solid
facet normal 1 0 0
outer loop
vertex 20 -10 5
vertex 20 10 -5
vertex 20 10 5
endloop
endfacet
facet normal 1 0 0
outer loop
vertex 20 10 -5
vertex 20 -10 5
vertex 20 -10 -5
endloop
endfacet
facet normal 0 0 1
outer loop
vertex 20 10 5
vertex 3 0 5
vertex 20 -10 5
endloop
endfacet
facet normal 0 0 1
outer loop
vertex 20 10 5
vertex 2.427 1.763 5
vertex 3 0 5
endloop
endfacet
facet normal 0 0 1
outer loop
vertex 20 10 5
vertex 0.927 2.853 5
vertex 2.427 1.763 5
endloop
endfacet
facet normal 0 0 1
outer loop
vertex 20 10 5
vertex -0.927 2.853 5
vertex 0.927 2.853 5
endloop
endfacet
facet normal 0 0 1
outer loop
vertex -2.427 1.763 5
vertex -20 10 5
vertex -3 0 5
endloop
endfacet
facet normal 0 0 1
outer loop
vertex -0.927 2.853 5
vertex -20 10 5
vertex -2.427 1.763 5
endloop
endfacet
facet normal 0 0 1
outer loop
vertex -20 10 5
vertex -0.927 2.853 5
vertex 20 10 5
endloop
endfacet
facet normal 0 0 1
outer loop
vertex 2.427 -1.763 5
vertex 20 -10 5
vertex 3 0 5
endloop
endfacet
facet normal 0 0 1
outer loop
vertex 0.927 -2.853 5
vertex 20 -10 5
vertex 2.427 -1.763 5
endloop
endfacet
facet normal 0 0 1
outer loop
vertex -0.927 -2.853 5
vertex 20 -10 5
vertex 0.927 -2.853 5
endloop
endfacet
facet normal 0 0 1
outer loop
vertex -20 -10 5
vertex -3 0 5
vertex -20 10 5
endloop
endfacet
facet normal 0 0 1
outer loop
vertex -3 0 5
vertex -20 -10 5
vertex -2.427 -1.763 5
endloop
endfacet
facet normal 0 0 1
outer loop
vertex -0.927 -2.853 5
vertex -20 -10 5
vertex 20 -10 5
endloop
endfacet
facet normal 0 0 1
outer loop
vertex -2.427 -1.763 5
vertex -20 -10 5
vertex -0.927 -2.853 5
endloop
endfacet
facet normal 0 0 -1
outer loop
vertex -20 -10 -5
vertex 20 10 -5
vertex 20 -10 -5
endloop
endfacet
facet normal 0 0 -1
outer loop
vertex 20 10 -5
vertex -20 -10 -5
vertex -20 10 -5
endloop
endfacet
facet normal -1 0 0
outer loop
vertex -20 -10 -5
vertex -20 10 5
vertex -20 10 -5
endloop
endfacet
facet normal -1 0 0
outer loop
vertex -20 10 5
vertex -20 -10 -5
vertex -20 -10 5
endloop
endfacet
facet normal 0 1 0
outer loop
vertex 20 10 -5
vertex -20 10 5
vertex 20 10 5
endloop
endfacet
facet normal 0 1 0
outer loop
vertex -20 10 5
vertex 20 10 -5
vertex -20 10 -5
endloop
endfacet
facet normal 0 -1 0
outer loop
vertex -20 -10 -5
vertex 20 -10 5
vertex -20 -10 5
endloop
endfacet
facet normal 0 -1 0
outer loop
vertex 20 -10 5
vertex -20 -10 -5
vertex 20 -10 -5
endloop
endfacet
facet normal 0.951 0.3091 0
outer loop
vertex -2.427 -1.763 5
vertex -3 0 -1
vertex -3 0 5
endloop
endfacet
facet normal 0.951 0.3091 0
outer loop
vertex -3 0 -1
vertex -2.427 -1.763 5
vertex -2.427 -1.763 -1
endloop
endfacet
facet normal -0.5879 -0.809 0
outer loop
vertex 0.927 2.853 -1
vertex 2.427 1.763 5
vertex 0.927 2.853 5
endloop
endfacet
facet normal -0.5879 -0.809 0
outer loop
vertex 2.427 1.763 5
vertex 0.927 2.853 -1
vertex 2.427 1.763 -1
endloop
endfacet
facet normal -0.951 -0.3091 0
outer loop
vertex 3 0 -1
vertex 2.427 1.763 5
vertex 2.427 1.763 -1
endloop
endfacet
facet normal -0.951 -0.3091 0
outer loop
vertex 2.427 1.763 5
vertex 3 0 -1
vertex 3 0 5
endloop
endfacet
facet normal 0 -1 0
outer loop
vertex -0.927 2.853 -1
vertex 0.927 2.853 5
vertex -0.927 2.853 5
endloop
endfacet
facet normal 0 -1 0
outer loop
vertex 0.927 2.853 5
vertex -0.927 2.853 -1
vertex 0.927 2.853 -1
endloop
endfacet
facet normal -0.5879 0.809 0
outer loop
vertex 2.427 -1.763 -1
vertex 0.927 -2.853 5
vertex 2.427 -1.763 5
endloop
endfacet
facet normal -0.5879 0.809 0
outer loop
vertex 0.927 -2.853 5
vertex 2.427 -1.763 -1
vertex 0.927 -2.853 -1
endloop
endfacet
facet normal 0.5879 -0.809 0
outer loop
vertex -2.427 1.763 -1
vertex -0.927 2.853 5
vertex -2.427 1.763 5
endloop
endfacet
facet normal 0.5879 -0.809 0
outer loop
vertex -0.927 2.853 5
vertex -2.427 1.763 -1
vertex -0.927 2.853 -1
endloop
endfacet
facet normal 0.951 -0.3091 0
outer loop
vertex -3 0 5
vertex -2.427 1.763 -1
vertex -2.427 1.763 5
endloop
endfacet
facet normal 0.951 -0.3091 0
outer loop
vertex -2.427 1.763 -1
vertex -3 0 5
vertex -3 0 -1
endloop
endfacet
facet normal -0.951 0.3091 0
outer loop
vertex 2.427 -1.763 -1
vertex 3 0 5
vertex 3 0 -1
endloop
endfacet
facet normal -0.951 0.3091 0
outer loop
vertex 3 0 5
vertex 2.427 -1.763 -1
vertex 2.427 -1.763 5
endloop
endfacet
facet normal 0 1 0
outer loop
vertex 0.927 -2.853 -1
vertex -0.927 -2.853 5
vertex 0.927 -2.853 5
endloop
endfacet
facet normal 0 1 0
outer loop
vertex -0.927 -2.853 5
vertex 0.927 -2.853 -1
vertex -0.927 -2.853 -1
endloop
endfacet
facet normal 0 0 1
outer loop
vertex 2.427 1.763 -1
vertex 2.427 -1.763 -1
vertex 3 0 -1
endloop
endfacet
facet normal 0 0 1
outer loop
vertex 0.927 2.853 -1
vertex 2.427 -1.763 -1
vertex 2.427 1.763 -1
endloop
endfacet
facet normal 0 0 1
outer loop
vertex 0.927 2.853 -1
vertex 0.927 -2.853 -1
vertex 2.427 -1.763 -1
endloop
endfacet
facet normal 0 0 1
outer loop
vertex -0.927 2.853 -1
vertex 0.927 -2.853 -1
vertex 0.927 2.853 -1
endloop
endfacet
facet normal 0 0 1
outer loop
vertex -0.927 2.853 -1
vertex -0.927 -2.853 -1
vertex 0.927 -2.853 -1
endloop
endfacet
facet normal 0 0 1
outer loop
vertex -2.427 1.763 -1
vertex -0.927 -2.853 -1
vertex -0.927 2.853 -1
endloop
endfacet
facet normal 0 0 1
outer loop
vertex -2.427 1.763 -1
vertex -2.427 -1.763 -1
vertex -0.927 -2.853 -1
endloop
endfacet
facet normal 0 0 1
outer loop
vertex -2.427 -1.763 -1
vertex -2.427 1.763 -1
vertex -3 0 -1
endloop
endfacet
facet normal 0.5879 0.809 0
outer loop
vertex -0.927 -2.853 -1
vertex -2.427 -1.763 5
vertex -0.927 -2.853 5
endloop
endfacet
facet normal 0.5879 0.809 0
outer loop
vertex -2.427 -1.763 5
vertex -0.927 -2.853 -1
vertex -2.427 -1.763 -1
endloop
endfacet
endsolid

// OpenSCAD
// Groove cut with a boolean center (issue #436 correct form).
difference() {
  cube(size = [40, 20, 10], center = true);
  translate([0, 0, 5]) cylinder(h = 12, r = 3, center = true);
}
